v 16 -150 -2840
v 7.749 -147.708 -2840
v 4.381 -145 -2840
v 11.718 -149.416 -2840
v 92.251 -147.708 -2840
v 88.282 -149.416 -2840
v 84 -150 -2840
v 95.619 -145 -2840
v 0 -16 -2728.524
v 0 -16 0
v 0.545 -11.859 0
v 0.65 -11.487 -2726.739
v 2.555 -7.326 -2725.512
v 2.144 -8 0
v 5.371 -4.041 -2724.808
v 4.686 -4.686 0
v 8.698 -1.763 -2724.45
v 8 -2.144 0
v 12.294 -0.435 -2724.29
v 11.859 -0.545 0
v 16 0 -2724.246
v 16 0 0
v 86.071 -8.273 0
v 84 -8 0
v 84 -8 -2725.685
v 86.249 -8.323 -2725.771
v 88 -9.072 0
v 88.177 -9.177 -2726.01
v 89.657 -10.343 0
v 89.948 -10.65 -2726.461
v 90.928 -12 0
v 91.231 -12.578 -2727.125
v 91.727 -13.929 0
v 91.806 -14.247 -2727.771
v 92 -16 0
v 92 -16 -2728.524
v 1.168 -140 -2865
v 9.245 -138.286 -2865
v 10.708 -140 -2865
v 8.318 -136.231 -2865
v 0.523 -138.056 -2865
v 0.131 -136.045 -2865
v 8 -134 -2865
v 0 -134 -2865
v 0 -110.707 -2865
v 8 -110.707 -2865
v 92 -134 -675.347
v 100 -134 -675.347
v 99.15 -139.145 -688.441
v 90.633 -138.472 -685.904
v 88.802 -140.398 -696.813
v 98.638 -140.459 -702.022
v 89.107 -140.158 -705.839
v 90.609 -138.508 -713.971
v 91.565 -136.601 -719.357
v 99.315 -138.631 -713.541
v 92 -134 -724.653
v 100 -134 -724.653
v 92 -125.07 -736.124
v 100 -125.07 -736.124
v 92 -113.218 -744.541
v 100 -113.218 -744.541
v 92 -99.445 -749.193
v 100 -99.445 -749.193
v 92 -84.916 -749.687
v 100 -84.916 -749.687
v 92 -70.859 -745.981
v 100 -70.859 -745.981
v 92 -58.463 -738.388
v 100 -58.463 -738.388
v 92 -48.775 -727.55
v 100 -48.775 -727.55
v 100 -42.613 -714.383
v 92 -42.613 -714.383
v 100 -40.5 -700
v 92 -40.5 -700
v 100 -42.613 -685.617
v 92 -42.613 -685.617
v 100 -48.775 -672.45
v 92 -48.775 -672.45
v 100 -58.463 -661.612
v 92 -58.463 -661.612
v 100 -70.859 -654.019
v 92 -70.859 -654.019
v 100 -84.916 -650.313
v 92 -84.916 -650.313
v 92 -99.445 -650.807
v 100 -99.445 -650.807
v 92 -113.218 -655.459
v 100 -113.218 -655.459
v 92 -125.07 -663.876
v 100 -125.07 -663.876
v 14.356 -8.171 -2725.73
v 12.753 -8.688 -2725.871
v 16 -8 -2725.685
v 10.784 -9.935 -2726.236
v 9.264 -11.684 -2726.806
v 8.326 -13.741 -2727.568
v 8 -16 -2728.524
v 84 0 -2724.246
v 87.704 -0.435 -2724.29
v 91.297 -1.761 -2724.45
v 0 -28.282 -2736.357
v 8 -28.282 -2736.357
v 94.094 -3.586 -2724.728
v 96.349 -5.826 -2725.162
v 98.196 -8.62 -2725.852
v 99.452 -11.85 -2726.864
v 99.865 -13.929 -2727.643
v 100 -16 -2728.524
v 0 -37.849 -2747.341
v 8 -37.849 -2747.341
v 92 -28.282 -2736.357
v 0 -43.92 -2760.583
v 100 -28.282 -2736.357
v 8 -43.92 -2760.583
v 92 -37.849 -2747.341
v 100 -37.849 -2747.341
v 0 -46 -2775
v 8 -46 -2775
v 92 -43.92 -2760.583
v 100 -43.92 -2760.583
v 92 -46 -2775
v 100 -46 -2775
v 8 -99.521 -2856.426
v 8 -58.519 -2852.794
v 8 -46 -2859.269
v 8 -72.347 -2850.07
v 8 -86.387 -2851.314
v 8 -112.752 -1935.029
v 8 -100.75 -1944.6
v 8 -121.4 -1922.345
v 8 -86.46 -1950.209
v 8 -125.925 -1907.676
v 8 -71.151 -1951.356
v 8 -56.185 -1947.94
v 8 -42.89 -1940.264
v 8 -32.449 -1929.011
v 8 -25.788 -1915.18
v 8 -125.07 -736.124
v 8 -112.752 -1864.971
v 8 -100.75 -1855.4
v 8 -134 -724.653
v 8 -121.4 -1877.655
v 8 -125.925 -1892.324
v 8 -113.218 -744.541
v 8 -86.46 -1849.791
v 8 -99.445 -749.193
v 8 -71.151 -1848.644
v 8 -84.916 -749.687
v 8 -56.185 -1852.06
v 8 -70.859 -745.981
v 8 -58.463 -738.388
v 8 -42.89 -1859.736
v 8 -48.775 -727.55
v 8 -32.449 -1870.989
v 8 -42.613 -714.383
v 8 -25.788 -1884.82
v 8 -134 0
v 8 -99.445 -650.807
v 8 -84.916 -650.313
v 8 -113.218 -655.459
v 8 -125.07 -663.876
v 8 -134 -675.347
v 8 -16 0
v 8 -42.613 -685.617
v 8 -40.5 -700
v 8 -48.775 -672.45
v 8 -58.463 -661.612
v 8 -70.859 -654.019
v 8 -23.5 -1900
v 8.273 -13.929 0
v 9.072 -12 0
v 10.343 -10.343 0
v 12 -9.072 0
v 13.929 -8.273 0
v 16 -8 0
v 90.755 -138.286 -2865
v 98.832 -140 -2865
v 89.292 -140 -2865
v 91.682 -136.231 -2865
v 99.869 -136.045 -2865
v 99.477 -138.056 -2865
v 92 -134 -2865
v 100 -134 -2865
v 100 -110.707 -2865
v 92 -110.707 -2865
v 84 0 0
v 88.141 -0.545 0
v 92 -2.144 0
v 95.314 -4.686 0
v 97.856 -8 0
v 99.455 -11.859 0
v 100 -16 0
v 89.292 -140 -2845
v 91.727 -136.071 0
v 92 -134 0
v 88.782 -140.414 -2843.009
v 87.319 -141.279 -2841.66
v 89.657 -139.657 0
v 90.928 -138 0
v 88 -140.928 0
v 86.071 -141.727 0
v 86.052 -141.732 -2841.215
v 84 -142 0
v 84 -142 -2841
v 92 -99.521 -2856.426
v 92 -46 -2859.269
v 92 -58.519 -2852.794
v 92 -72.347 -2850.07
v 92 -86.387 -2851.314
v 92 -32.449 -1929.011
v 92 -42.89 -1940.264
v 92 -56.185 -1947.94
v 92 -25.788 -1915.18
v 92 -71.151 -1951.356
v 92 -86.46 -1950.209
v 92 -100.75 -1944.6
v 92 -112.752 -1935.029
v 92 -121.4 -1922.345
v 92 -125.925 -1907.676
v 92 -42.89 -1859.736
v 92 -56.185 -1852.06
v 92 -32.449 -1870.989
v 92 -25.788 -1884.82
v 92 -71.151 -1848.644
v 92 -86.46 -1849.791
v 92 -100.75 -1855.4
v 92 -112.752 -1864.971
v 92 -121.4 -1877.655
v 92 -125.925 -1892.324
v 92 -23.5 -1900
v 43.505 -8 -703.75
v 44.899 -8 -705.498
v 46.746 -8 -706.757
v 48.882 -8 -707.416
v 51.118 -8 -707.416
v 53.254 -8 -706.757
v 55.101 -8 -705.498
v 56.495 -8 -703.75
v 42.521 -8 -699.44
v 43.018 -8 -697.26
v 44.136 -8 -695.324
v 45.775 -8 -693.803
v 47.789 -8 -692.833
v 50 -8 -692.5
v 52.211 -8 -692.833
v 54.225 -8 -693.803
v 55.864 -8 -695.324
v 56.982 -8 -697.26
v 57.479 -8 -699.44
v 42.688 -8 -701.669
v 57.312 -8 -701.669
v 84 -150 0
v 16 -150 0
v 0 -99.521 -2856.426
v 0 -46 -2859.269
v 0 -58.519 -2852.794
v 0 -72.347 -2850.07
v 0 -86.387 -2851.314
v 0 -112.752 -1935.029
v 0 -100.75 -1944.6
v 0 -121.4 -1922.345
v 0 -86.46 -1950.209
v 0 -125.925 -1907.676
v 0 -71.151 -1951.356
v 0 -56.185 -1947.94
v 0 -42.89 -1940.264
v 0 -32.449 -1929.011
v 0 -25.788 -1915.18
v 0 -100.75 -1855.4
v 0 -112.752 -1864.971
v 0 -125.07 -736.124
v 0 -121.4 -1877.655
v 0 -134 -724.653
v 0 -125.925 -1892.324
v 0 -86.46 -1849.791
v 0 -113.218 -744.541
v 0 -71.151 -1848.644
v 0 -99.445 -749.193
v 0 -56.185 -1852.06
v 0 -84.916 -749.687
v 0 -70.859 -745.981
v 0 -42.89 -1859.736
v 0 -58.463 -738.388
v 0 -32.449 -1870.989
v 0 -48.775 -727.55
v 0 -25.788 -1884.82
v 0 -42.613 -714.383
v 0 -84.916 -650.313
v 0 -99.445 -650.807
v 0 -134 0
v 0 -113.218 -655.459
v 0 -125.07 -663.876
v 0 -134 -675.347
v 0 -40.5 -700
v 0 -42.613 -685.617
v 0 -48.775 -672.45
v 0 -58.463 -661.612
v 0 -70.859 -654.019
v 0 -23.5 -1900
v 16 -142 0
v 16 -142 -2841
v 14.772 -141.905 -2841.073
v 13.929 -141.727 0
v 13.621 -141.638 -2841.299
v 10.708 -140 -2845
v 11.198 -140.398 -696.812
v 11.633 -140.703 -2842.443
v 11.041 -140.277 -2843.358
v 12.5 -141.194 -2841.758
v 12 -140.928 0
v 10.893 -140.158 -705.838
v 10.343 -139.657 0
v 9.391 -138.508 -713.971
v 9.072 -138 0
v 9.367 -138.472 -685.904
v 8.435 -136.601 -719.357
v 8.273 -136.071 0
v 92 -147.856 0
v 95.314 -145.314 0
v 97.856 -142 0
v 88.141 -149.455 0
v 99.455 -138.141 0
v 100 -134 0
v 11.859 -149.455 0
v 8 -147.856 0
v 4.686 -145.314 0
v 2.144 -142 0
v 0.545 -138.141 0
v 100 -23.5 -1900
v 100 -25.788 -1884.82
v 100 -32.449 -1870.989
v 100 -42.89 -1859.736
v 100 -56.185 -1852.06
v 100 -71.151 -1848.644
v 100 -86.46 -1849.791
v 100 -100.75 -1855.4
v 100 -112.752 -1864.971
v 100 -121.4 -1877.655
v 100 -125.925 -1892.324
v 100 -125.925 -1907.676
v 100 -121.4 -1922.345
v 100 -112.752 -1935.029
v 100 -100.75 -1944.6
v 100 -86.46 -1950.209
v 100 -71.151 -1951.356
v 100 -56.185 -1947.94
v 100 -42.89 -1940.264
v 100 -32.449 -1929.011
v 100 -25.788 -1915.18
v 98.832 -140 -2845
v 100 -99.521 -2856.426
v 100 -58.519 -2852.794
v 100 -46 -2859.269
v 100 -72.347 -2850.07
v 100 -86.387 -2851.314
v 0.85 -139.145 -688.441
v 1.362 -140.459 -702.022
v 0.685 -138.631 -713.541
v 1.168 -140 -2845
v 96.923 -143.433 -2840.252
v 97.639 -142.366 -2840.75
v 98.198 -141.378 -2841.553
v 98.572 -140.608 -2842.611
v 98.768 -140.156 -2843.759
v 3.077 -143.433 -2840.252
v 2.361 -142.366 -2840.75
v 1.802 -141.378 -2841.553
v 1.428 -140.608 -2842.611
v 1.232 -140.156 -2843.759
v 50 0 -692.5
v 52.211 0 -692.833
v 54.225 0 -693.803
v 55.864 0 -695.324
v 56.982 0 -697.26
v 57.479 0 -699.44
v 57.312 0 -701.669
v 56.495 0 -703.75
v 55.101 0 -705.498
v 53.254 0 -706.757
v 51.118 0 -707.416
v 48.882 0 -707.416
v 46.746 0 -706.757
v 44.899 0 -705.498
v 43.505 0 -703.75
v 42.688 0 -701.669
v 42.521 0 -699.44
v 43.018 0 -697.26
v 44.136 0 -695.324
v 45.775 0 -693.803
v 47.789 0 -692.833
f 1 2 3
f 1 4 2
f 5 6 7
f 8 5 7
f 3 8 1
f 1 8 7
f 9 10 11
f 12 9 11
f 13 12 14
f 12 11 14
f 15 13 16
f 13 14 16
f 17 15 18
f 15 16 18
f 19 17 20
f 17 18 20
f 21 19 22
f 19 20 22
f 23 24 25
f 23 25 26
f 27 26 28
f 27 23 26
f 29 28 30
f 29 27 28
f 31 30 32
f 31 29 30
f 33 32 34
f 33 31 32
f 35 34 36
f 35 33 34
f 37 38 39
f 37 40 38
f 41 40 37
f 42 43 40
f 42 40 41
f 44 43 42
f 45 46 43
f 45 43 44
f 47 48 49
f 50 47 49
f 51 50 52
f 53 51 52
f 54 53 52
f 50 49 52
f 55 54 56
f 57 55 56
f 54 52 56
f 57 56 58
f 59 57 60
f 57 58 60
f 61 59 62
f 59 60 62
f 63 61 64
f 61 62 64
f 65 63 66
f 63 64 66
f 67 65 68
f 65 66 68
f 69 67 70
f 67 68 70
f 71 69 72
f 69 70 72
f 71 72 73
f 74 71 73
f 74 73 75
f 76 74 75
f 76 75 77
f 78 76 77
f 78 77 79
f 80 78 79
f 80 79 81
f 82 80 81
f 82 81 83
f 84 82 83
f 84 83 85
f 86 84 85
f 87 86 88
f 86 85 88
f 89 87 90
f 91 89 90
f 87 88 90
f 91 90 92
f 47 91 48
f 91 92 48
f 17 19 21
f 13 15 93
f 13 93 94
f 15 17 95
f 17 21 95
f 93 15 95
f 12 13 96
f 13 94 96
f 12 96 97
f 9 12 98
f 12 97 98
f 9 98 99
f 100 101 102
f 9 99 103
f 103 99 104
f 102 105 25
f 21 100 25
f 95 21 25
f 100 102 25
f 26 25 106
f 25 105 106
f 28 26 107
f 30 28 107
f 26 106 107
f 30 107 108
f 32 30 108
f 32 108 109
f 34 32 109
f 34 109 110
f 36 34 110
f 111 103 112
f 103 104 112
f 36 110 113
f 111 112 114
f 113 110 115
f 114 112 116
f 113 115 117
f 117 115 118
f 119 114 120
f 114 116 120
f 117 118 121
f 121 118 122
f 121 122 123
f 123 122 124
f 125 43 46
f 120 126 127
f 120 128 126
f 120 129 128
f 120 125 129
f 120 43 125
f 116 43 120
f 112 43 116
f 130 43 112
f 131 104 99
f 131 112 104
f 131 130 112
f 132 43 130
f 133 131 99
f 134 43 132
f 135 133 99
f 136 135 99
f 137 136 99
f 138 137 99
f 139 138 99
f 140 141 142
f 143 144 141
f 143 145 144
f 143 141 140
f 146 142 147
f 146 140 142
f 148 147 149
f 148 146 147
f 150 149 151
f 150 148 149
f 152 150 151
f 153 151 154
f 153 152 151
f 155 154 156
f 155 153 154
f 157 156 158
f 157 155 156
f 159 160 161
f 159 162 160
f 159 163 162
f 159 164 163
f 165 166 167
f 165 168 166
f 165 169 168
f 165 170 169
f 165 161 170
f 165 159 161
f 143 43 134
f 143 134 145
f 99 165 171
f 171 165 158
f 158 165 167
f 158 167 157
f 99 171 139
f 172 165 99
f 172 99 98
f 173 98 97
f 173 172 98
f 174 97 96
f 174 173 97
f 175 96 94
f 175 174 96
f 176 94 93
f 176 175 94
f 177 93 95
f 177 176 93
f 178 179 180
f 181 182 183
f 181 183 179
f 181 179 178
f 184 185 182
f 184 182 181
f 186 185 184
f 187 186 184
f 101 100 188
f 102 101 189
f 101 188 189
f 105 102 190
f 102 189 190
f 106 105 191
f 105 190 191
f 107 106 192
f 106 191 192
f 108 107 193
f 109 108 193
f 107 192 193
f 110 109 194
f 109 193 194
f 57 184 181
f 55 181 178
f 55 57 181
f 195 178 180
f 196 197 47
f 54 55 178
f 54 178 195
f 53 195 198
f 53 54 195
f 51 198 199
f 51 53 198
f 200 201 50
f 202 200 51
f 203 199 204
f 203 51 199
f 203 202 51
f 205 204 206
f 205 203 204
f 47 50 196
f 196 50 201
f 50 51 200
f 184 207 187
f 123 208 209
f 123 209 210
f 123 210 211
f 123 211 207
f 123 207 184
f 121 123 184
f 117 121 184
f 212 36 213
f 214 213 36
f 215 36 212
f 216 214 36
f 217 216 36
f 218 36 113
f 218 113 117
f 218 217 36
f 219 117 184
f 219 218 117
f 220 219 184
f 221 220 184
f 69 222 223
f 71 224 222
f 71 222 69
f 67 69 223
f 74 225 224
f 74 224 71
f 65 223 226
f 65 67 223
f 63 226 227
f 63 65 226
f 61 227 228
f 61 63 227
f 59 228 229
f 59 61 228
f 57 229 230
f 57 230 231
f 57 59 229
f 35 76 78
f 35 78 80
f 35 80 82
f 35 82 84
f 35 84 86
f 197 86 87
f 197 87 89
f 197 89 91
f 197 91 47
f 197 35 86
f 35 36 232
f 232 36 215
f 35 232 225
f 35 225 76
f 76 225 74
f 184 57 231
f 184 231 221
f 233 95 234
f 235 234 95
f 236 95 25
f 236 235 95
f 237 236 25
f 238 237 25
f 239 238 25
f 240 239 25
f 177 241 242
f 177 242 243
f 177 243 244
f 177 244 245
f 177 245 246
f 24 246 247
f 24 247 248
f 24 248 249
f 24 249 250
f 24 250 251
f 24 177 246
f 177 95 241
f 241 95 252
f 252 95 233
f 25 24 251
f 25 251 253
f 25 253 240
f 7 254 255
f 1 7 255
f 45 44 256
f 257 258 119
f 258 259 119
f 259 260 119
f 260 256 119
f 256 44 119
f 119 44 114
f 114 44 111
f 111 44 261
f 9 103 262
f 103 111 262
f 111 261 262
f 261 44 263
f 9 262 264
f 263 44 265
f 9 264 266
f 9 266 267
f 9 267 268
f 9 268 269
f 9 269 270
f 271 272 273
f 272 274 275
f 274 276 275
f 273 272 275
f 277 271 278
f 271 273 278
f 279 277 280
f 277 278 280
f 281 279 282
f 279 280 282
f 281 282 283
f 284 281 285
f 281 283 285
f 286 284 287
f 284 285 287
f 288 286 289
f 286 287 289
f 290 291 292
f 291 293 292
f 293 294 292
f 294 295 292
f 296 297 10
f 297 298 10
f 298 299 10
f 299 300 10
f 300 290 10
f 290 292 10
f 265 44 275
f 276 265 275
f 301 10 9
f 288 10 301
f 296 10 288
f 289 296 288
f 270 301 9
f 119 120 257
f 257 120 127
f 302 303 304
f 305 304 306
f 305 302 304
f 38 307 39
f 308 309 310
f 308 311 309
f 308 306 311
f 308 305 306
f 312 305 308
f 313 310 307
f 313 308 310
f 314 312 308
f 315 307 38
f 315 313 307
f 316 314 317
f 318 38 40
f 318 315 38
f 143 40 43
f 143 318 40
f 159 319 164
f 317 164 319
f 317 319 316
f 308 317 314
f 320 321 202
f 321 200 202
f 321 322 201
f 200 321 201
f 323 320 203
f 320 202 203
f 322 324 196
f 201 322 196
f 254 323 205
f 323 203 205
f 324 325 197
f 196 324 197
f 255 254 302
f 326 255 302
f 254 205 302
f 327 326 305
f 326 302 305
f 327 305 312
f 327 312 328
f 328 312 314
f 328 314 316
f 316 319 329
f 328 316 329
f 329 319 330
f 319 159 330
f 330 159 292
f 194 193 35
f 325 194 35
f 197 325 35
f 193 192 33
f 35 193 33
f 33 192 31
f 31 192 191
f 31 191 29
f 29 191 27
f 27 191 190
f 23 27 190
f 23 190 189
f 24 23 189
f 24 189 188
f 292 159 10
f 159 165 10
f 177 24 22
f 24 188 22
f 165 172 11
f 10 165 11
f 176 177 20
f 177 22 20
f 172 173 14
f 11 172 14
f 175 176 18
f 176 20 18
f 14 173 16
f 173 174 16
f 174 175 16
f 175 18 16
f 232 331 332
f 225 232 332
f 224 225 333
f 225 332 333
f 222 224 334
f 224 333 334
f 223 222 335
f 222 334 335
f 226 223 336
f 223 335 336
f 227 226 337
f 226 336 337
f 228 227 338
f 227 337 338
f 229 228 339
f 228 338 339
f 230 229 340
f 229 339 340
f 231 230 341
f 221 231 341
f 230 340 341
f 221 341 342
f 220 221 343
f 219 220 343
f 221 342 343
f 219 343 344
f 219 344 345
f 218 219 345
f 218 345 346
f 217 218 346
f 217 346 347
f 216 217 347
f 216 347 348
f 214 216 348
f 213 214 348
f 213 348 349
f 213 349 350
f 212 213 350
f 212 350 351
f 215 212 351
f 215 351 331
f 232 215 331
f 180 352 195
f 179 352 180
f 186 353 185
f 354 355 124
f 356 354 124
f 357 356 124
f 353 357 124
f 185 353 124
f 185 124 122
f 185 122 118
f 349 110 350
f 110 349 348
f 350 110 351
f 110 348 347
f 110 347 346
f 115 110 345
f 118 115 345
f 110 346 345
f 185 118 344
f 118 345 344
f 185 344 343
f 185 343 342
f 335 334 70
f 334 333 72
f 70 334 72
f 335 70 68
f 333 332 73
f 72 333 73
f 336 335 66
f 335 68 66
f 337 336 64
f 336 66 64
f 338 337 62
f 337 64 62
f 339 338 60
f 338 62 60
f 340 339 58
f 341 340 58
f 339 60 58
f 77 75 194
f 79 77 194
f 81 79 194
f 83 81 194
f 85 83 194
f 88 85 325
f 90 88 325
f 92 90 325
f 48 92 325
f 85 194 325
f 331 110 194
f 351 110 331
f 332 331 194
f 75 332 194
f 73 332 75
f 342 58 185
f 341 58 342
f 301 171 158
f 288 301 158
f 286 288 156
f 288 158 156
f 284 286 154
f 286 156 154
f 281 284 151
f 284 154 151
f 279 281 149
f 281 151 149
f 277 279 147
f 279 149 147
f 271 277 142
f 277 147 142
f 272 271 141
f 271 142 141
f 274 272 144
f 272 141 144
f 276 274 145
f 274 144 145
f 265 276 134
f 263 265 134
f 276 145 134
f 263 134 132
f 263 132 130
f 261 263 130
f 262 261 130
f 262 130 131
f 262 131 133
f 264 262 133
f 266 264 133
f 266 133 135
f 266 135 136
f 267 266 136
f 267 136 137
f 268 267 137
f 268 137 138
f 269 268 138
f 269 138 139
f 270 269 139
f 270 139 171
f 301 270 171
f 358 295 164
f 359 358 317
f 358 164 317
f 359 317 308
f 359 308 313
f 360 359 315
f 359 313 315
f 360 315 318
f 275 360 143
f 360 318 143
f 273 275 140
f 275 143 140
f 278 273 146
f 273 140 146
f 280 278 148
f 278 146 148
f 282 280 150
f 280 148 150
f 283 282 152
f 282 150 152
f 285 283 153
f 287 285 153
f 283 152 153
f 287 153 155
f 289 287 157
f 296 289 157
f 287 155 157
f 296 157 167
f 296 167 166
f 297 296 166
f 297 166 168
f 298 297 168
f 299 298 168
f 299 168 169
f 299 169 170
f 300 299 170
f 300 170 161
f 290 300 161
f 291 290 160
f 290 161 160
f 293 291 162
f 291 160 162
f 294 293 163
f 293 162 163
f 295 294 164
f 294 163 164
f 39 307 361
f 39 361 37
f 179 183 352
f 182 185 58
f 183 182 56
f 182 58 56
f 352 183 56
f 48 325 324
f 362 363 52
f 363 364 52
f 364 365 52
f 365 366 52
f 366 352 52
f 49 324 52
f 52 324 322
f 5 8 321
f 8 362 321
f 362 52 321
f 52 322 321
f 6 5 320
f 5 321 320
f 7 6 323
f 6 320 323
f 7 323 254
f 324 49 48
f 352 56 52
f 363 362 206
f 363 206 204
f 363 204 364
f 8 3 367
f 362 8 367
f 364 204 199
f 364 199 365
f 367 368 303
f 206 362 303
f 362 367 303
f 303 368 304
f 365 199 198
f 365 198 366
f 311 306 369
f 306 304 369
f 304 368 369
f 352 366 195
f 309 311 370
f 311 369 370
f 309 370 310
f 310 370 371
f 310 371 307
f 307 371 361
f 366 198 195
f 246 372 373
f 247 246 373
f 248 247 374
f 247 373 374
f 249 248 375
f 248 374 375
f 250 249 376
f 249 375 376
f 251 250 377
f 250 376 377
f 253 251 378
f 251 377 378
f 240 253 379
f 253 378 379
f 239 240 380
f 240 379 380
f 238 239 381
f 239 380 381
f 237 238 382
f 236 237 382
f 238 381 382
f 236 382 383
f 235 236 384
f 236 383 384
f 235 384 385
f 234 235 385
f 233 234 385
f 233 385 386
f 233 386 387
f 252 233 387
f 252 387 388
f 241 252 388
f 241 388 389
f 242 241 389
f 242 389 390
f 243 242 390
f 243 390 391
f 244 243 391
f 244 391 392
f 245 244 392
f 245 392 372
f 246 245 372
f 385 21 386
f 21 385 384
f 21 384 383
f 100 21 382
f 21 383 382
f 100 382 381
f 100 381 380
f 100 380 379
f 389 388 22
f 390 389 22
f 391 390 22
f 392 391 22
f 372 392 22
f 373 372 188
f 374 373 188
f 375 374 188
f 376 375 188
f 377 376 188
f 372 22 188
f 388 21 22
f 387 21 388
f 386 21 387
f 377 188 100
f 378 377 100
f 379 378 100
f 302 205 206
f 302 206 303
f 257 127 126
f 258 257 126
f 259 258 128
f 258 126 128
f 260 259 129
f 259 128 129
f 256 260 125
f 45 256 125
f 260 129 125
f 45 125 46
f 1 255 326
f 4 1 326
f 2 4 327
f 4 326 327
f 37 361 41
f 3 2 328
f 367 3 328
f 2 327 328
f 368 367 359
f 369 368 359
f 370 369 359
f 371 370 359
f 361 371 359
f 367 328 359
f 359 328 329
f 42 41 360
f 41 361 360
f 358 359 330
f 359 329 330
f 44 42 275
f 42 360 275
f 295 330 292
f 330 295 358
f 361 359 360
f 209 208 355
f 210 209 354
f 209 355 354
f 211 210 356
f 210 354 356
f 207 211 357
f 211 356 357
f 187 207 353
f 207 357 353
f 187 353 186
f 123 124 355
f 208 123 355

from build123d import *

# Parameters (mm, degrees)
EXTRUDE_1_DEPTH     = 2865
SKETCH_4_R          = 50
CUT_EXTRUDE_3_DEPTH = 2871.666298963
SKETCH_3_R          = 50
SKETCH_3_R_2        = 51.5
SKETCH_3_W          = 25
SKETCH_3_H          = 10
CUT_EXTRUDE_2_DEPTH = 2871.666298963
FILLET_2_R          = 5
CUT_EXTRUDE_4_REACH = 2872.666
SKETCH_5_R          = 7.5


with BuildPart() as part:
    # 草图1 → 凸台-拉伸1 (new body)
    with BuildSketch(Plane.XY):
        with BuildLine():
            Line((16, 0), (84, 0))
            ThreePointArc((84, 0), (95.313708499, -4.686291501), (100, -16))
            Line((100, -16), (100, -134))
            ThreePointArc((100, -134), (95.313708499, -145.313708499), (84, -150))
            Line((84, -150), (16, -150))
            ThreePointArc((16, -150), (4.686291501, -145.313708499), (0, -134))
            Line((0, -134), (0, -16))
            ThreePointArc((0, -16), (4.686291501, -4.686291501), (16, 0))
        make_face()
        with BuildLine():
            Line((16, -8), (84, -8))
            ThreePointArc((84, -8), (89.656854249, -10.343145751), (92, -16))
            Line((92, -16), (92, -134))
            ThreePointArc((92, -134), (89.656854249, -139.656854249), (84, -142))
            Line((84, -142), (16, -142))
            ThreePointArc((16, -142), (10.343145751, -139.656854249), (8, -134))
            Line((8, -134), (8, -16))
            ThreePointArc((8, -16), (10.343145751, -10.343145751), (16, -8))
        make_face(mode=Mode.SUBTRACT)
    extrude(amount=-EXTRUDE_1_DEPTH)

    # 草图4 → 切除-拉伸3 (cut, through all)
    with BuildSketch(Plane(origin=(100, 0, 0), x_dir=(0, 0, -1), z_dir=(1, 0, 0))):
        with Locations((2900, -75)):
            Circle(SKETCH_4_R)
    extrude(amount=-CUT_EXTRUDE_3_DEPTH, mode=Mode.SUBTRACT)

    # 草图3 → 切除-拉伸2 (cut, through all)
    with BuildSketch(Plane(origin=(100, 0, 0), x_dir=(0, 0, -1), z_dir=(1, 0, 0))):
        with Locations(Location((700, -90.5, 0), (0, 0, 240.4586395))):
            Circle(SKETCH_3_R)
        with Locations(Location((1900, -75, 0), (0, 0, 90))):
            Circle(SKETCH_3_R_2)
        with BuildLine():
            Line((2775, -46), (2865, -46))
            Line((2865, -46), (2865, 0))
            Line((2865, 0), (2724.245689838, 0))
            ThreePointArc((2724.245689838, 0), (2740.750912421, -32.788887255), (2775, -46))
        make_face()
        with Locations((2852.5, -145)):
            Rectangle(SKETCH_3_W, SKETCH_3_H)
    extrude(amount=-CUT_EXTRUDE_2_DEPTH, mode=Mode.SUBTRACT)

    # 圆角2
    fillet_2_edges = [part.edges().sort_by_distance(p)[0] for p in [
        (94.061949798, -140, -2840),
    ]]
    fillet(fillet_2_edges, radius=FILLET_2_R)

    # 草图5 → 切除-拉伸4 (cut, up to next)
    with BuildSketch(Plane(origin=(0, 0, 0), x_dir=(1, 0, 0), z_dir=(0, 1, 0)), mode=Mode.PRIVATE) as cut_extrude_4_sk1:
        with Locations(Location((50, 700, 0), (0, 0, 270))):
            Circle(SKETCH_5_R)
    cut_extrude_4_tool1 = extrude(cut_extrude_4_sk1.sketch, amount=-CUT_EXTRUDE_4_REACH, mode=Mode.PRIVATE) & part.part
    add(cut_extrude_4_tool1.solids().sort_by_distance((50, 0, -700))[0], mode=Mode.SUBTRACT)


solid = part.part
